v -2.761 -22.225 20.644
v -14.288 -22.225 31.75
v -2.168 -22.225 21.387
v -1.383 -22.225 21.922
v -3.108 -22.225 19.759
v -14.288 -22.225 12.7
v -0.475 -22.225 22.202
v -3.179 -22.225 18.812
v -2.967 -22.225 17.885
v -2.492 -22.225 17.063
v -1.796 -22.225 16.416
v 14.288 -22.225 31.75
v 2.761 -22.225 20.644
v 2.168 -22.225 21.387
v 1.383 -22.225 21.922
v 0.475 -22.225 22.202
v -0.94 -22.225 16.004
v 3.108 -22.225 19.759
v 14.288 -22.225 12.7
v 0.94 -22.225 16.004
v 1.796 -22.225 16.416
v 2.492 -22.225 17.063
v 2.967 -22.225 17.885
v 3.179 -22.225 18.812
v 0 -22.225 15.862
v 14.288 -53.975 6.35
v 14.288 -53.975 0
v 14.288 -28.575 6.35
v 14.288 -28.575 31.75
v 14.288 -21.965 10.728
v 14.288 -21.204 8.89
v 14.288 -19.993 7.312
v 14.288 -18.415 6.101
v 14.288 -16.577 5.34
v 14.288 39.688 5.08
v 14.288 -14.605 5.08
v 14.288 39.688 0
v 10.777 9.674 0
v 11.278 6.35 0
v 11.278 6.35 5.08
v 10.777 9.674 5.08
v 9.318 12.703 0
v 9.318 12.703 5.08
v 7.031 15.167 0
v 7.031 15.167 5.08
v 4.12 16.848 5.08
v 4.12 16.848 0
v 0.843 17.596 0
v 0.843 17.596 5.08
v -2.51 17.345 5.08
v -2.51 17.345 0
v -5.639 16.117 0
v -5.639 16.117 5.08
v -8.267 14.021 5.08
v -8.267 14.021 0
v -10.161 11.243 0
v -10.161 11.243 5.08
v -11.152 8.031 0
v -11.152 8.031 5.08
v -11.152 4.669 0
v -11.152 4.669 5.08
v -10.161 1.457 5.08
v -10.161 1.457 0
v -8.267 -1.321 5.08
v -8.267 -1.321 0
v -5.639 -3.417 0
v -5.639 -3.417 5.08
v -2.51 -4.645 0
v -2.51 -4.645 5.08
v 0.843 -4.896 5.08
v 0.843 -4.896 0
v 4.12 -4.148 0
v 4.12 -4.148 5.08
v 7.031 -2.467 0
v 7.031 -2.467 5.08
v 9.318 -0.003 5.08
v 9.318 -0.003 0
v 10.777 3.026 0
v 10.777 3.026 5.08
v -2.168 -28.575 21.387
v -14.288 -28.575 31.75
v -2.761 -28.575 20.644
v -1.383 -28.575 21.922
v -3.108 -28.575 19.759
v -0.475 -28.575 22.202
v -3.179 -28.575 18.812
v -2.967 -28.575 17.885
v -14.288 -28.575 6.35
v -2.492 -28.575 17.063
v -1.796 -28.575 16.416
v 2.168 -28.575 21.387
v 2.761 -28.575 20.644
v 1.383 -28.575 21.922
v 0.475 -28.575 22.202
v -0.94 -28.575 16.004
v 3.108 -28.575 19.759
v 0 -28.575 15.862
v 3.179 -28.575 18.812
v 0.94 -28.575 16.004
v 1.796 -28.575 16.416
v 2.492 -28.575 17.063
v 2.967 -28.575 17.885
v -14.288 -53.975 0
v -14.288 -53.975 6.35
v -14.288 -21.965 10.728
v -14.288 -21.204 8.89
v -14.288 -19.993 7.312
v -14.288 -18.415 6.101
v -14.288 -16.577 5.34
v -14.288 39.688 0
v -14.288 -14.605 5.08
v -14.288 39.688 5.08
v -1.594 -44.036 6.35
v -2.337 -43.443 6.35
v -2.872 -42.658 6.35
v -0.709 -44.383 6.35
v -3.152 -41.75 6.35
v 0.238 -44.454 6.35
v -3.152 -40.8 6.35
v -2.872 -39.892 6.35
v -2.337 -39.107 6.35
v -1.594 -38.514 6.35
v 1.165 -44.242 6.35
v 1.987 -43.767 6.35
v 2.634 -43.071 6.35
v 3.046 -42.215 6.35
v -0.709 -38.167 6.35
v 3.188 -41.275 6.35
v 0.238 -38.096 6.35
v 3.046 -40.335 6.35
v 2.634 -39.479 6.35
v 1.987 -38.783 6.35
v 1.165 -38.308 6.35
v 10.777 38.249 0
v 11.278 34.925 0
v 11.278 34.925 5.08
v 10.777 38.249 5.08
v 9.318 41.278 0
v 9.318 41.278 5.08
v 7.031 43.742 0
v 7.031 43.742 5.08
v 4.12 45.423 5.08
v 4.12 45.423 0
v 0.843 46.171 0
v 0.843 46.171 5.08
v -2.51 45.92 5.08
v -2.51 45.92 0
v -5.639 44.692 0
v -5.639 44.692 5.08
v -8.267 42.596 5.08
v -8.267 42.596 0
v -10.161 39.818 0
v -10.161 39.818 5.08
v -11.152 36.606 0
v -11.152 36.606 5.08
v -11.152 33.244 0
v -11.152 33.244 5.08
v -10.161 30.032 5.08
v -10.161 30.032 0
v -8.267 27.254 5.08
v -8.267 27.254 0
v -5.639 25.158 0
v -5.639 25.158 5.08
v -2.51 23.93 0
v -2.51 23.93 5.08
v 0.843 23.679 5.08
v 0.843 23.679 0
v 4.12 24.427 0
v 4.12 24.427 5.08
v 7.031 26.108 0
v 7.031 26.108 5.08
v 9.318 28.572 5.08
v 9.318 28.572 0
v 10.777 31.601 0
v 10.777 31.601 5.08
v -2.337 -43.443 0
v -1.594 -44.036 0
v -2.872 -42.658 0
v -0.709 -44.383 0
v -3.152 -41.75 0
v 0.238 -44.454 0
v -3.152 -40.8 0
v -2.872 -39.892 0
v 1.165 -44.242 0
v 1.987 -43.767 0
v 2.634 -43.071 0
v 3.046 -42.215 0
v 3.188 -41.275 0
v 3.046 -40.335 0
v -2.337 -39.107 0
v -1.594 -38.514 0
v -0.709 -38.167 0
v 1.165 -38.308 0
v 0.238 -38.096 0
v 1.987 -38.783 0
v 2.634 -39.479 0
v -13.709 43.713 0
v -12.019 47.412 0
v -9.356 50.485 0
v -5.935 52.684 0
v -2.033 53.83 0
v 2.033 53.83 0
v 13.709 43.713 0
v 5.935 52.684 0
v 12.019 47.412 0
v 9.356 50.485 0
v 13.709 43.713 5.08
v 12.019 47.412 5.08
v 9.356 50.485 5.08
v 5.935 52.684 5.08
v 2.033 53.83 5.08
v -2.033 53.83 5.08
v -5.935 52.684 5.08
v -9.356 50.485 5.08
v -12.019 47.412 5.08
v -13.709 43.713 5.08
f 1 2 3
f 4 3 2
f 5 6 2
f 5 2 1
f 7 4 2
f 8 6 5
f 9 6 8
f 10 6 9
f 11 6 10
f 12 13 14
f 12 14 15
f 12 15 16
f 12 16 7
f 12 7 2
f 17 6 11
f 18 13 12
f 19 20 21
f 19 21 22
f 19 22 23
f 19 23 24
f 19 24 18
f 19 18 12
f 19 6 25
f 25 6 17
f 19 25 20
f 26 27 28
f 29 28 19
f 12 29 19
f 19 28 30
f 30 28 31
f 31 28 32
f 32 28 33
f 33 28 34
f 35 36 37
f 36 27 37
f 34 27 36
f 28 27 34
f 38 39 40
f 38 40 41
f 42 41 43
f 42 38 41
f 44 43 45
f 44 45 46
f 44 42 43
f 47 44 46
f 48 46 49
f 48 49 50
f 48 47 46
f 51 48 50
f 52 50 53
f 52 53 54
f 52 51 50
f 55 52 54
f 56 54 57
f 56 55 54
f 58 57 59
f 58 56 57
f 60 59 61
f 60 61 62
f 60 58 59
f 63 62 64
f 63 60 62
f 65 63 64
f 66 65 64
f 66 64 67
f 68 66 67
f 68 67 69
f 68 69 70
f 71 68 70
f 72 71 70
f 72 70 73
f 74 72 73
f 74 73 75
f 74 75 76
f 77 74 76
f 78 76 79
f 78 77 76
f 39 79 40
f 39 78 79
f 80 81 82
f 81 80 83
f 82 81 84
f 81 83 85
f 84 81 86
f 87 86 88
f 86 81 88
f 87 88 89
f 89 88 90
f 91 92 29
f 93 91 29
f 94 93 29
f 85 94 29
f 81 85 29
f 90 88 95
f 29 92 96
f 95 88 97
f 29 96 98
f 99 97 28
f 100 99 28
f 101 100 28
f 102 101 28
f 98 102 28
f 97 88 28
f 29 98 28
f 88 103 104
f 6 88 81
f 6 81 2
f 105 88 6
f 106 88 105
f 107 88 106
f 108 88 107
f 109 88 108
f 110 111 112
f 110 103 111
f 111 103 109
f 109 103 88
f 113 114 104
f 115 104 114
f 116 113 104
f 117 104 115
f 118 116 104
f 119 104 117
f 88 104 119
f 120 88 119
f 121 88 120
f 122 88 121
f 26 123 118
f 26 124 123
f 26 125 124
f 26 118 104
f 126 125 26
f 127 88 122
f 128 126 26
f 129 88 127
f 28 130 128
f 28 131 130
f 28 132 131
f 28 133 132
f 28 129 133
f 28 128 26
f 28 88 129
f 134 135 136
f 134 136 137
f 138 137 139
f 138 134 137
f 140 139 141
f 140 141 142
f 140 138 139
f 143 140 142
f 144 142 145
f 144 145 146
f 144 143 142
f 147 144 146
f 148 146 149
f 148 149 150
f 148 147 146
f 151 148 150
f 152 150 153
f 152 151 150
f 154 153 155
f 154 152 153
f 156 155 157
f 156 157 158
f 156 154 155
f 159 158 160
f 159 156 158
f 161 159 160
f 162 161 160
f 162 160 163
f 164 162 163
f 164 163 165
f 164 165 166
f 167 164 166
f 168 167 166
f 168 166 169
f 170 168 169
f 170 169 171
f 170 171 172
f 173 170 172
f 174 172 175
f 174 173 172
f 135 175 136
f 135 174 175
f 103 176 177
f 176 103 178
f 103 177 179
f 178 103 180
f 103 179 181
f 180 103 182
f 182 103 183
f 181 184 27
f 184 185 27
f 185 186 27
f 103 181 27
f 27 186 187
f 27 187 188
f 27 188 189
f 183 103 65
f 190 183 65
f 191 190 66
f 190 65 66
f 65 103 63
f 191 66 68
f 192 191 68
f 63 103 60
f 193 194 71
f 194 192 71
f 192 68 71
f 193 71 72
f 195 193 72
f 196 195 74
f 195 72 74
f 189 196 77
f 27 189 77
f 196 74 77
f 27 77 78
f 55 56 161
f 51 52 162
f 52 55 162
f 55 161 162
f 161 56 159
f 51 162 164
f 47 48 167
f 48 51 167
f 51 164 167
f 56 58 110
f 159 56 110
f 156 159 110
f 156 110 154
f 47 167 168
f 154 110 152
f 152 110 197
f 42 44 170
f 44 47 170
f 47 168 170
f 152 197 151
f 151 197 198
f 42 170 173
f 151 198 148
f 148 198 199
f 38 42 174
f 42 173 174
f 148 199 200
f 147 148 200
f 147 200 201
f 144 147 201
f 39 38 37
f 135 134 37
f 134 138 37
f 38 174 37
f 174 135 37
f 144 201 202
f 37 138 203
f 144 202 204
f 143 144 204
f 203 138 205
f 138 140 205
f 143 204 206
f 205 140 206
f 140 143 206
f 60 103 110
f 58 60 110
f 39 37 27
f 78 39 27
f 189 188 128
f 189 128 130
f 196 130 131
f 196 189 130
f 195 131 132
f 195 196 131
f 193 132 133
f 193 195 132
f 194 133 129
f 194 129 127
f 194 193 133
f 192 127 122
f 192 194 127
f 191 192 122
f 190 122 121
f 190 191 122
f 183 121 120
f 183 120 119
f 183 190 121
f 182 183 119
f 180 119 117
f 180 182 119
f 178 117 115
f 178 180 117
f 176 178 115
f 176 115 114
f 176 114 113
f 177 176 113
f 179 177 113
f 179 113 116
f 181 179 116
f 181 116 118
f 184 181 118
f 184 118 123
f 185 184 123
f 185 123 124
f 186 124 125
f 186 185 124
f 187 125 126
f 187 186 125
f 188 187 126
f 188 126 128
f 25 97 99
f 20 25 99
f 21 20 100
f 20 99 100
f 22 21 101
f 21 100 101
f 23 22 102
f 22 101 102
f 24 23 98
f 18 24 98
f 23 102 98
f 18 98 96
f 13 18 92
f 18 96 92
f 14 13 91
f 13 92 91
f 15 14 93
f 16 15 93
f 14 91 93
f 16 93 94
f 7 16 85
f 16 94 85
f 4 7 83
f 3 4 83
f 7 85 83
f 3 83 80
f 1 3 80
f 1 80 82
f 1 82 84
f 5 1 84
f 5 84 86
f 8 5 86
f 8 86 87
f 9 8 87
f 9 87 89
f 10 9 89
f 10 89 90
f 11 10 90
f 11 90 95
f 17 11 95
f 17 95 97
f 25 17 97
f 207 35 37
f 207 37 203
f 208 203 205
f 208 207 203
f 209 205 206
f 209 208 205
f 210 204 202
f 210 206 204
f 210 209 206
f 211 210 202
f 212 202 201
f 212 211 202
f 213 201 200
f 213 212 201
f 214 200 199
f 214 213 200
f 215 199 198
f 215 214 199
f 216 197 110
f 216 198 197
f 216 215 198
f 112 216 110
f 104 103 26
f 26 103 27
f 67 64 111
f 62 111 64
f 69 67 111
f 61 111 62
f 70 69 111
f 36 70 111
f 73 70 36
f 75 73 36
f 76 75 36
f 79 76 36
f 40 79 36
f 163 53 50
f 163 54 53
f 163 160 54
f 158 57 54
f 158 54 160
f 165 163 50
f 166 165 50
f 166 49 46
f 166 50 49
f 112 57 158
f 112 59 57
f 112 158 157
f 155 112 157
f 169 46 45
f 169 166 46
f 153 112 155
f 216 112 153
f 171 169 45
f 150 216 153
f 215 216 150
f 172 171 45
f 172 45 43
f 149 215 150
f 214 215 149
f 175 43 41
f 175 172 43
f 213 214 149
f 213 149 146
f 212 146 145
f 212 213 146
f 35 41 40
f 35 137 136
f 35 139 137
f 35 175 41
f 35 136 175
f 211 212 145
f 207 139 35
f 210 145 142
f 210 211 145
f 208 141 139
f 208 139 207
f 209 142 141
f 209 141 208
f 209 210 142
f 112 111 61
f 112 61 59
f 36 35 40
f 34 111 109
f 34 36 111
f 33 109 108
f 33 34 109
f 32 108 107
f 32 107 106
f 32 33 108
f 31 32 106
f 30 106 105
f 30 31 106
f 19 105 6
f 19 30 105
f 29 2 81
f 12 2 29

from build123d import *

# Parameters (mm, degrees)
SKETCH1_W           = 28.575
SKETCH1_H           = 76.2
SKETCH1_R           = 11.2776
BOSS_EXTRUDE1_DEPTH = 5.08
SKETCH1_3_W         = 28.575
SKETCH1_3_H         = 25.4
SKETCH1_3_R         = 3.1877
BOSS_EXTRUDE2_DEPTH = 6.35
SKETCH1_4_W         = 28.575
SKETCH1_4_H         = 6.35
BOSS_EXTRUDE3_DEPTH = 31.75
FILLET1_R           = 7.62
FILLET3_RADIUS      = 14.2875
FILLET3_LENGTH      = 5.08
SKETCH2_R           = 3.1877
CUT_EXTRUDE1_DEPTH  = 90.591839228


with BuildPart() as part:
    # Sketch1 → Boss-Extrude1 (new body)
    with BuildSketch(Plane.XY):
        with Locations((0, 15.875)):
            Rectangle(SKETCH1_W, SKETCH1_H)
        with Locations((0, 6.35)):
            Circle(SKETCH1_R, mode=Mode.SUBTRACT)
        with Locations((0, 34.925)):
            Circle(SKETCH1_R, mode=Mode.SUBTRACT)
    extrude(amount=BOSS_EXTRUDE1_DEPTH)



with BuildPart() as body_2:
    # Sketch1<3> → Boss-Extrude2 (new body)
    with BuildSketch(Plane.XY):
        with Locations((0, -41.275)):
            Rectangle(SKETCH1_3_W, SKETCH1_3_H)
        with Locations((0, -41.275)):
            Circle(SKETCH1_3_R, mode=Mode.SUBTRACT)
    extrude(amount=BOSS_EXTRUDE2_DEPTH)


with BuildPart() as part_1:
    add(part.part)

    add(body_2.part)  # Boss-Extrude3 merges body 2
    # Sketch1<4> → Boss-Extrude3 (add)
    with BuildSketch(Plane.XY):
        with Locations((0, -25.4)):
            Rectangle(SKETCH1_4_W, SKETCH1_4_H)
    extrude(amount=BOSS_EXTRUDE3_DEPTH)

    # Fillet1
    fillet1_edges = [part_1.edges().sort_by_distance(p)[0] for p in [
        (0, -22.225, 5.08),
    ]]
    fillet(fillet1_edges, radius=FILLET1_R)

    # Fillet3: full round fillet: the end face becomes a half cylinder, R = half its width
    fillet3_face = Plane((0, 53.975, 2.54), x_dir=(0, 0, 1), z_dir=(0, 1, 0))  # on the end face: x along it, z out of the body
    fillet3_slab = fillet3_face.offset(-FILLET3_RADIUS / 2) * Box(FILLET3_LENGTH, 2 * FILLET3_RADIUS, FILLET3_RADIUS, mode=Mode.PRIVATE)  # the body's end, R deep
    fillet3_round = Plane((0, 39.6875, 2.54), x_dir=(0, 1, 0), z_dir=(0, 0, 1)) * Cylinder(FILLET3_RADIUS, FILLET3_LENGTH, mode=Mode.PRIVATE)  # its axis R under the face
    add(fillet3_slab - fillet3_round, mode=Mode.SUBTRACT)

    # Sketch2 → Cut-Extrude1 (cut, through all)
    with BuildSketch(Plane.XZ.offset(28.575)):
        with Locations(Location((0, 19.05, 0), (0, 0, 270))):
            Circle(SKETCH2_R)
    extrude(amount=-CUT_EXTRUDE1_DEPTH, mode=Mode.SUBTRACT)


solid = part_1.part
